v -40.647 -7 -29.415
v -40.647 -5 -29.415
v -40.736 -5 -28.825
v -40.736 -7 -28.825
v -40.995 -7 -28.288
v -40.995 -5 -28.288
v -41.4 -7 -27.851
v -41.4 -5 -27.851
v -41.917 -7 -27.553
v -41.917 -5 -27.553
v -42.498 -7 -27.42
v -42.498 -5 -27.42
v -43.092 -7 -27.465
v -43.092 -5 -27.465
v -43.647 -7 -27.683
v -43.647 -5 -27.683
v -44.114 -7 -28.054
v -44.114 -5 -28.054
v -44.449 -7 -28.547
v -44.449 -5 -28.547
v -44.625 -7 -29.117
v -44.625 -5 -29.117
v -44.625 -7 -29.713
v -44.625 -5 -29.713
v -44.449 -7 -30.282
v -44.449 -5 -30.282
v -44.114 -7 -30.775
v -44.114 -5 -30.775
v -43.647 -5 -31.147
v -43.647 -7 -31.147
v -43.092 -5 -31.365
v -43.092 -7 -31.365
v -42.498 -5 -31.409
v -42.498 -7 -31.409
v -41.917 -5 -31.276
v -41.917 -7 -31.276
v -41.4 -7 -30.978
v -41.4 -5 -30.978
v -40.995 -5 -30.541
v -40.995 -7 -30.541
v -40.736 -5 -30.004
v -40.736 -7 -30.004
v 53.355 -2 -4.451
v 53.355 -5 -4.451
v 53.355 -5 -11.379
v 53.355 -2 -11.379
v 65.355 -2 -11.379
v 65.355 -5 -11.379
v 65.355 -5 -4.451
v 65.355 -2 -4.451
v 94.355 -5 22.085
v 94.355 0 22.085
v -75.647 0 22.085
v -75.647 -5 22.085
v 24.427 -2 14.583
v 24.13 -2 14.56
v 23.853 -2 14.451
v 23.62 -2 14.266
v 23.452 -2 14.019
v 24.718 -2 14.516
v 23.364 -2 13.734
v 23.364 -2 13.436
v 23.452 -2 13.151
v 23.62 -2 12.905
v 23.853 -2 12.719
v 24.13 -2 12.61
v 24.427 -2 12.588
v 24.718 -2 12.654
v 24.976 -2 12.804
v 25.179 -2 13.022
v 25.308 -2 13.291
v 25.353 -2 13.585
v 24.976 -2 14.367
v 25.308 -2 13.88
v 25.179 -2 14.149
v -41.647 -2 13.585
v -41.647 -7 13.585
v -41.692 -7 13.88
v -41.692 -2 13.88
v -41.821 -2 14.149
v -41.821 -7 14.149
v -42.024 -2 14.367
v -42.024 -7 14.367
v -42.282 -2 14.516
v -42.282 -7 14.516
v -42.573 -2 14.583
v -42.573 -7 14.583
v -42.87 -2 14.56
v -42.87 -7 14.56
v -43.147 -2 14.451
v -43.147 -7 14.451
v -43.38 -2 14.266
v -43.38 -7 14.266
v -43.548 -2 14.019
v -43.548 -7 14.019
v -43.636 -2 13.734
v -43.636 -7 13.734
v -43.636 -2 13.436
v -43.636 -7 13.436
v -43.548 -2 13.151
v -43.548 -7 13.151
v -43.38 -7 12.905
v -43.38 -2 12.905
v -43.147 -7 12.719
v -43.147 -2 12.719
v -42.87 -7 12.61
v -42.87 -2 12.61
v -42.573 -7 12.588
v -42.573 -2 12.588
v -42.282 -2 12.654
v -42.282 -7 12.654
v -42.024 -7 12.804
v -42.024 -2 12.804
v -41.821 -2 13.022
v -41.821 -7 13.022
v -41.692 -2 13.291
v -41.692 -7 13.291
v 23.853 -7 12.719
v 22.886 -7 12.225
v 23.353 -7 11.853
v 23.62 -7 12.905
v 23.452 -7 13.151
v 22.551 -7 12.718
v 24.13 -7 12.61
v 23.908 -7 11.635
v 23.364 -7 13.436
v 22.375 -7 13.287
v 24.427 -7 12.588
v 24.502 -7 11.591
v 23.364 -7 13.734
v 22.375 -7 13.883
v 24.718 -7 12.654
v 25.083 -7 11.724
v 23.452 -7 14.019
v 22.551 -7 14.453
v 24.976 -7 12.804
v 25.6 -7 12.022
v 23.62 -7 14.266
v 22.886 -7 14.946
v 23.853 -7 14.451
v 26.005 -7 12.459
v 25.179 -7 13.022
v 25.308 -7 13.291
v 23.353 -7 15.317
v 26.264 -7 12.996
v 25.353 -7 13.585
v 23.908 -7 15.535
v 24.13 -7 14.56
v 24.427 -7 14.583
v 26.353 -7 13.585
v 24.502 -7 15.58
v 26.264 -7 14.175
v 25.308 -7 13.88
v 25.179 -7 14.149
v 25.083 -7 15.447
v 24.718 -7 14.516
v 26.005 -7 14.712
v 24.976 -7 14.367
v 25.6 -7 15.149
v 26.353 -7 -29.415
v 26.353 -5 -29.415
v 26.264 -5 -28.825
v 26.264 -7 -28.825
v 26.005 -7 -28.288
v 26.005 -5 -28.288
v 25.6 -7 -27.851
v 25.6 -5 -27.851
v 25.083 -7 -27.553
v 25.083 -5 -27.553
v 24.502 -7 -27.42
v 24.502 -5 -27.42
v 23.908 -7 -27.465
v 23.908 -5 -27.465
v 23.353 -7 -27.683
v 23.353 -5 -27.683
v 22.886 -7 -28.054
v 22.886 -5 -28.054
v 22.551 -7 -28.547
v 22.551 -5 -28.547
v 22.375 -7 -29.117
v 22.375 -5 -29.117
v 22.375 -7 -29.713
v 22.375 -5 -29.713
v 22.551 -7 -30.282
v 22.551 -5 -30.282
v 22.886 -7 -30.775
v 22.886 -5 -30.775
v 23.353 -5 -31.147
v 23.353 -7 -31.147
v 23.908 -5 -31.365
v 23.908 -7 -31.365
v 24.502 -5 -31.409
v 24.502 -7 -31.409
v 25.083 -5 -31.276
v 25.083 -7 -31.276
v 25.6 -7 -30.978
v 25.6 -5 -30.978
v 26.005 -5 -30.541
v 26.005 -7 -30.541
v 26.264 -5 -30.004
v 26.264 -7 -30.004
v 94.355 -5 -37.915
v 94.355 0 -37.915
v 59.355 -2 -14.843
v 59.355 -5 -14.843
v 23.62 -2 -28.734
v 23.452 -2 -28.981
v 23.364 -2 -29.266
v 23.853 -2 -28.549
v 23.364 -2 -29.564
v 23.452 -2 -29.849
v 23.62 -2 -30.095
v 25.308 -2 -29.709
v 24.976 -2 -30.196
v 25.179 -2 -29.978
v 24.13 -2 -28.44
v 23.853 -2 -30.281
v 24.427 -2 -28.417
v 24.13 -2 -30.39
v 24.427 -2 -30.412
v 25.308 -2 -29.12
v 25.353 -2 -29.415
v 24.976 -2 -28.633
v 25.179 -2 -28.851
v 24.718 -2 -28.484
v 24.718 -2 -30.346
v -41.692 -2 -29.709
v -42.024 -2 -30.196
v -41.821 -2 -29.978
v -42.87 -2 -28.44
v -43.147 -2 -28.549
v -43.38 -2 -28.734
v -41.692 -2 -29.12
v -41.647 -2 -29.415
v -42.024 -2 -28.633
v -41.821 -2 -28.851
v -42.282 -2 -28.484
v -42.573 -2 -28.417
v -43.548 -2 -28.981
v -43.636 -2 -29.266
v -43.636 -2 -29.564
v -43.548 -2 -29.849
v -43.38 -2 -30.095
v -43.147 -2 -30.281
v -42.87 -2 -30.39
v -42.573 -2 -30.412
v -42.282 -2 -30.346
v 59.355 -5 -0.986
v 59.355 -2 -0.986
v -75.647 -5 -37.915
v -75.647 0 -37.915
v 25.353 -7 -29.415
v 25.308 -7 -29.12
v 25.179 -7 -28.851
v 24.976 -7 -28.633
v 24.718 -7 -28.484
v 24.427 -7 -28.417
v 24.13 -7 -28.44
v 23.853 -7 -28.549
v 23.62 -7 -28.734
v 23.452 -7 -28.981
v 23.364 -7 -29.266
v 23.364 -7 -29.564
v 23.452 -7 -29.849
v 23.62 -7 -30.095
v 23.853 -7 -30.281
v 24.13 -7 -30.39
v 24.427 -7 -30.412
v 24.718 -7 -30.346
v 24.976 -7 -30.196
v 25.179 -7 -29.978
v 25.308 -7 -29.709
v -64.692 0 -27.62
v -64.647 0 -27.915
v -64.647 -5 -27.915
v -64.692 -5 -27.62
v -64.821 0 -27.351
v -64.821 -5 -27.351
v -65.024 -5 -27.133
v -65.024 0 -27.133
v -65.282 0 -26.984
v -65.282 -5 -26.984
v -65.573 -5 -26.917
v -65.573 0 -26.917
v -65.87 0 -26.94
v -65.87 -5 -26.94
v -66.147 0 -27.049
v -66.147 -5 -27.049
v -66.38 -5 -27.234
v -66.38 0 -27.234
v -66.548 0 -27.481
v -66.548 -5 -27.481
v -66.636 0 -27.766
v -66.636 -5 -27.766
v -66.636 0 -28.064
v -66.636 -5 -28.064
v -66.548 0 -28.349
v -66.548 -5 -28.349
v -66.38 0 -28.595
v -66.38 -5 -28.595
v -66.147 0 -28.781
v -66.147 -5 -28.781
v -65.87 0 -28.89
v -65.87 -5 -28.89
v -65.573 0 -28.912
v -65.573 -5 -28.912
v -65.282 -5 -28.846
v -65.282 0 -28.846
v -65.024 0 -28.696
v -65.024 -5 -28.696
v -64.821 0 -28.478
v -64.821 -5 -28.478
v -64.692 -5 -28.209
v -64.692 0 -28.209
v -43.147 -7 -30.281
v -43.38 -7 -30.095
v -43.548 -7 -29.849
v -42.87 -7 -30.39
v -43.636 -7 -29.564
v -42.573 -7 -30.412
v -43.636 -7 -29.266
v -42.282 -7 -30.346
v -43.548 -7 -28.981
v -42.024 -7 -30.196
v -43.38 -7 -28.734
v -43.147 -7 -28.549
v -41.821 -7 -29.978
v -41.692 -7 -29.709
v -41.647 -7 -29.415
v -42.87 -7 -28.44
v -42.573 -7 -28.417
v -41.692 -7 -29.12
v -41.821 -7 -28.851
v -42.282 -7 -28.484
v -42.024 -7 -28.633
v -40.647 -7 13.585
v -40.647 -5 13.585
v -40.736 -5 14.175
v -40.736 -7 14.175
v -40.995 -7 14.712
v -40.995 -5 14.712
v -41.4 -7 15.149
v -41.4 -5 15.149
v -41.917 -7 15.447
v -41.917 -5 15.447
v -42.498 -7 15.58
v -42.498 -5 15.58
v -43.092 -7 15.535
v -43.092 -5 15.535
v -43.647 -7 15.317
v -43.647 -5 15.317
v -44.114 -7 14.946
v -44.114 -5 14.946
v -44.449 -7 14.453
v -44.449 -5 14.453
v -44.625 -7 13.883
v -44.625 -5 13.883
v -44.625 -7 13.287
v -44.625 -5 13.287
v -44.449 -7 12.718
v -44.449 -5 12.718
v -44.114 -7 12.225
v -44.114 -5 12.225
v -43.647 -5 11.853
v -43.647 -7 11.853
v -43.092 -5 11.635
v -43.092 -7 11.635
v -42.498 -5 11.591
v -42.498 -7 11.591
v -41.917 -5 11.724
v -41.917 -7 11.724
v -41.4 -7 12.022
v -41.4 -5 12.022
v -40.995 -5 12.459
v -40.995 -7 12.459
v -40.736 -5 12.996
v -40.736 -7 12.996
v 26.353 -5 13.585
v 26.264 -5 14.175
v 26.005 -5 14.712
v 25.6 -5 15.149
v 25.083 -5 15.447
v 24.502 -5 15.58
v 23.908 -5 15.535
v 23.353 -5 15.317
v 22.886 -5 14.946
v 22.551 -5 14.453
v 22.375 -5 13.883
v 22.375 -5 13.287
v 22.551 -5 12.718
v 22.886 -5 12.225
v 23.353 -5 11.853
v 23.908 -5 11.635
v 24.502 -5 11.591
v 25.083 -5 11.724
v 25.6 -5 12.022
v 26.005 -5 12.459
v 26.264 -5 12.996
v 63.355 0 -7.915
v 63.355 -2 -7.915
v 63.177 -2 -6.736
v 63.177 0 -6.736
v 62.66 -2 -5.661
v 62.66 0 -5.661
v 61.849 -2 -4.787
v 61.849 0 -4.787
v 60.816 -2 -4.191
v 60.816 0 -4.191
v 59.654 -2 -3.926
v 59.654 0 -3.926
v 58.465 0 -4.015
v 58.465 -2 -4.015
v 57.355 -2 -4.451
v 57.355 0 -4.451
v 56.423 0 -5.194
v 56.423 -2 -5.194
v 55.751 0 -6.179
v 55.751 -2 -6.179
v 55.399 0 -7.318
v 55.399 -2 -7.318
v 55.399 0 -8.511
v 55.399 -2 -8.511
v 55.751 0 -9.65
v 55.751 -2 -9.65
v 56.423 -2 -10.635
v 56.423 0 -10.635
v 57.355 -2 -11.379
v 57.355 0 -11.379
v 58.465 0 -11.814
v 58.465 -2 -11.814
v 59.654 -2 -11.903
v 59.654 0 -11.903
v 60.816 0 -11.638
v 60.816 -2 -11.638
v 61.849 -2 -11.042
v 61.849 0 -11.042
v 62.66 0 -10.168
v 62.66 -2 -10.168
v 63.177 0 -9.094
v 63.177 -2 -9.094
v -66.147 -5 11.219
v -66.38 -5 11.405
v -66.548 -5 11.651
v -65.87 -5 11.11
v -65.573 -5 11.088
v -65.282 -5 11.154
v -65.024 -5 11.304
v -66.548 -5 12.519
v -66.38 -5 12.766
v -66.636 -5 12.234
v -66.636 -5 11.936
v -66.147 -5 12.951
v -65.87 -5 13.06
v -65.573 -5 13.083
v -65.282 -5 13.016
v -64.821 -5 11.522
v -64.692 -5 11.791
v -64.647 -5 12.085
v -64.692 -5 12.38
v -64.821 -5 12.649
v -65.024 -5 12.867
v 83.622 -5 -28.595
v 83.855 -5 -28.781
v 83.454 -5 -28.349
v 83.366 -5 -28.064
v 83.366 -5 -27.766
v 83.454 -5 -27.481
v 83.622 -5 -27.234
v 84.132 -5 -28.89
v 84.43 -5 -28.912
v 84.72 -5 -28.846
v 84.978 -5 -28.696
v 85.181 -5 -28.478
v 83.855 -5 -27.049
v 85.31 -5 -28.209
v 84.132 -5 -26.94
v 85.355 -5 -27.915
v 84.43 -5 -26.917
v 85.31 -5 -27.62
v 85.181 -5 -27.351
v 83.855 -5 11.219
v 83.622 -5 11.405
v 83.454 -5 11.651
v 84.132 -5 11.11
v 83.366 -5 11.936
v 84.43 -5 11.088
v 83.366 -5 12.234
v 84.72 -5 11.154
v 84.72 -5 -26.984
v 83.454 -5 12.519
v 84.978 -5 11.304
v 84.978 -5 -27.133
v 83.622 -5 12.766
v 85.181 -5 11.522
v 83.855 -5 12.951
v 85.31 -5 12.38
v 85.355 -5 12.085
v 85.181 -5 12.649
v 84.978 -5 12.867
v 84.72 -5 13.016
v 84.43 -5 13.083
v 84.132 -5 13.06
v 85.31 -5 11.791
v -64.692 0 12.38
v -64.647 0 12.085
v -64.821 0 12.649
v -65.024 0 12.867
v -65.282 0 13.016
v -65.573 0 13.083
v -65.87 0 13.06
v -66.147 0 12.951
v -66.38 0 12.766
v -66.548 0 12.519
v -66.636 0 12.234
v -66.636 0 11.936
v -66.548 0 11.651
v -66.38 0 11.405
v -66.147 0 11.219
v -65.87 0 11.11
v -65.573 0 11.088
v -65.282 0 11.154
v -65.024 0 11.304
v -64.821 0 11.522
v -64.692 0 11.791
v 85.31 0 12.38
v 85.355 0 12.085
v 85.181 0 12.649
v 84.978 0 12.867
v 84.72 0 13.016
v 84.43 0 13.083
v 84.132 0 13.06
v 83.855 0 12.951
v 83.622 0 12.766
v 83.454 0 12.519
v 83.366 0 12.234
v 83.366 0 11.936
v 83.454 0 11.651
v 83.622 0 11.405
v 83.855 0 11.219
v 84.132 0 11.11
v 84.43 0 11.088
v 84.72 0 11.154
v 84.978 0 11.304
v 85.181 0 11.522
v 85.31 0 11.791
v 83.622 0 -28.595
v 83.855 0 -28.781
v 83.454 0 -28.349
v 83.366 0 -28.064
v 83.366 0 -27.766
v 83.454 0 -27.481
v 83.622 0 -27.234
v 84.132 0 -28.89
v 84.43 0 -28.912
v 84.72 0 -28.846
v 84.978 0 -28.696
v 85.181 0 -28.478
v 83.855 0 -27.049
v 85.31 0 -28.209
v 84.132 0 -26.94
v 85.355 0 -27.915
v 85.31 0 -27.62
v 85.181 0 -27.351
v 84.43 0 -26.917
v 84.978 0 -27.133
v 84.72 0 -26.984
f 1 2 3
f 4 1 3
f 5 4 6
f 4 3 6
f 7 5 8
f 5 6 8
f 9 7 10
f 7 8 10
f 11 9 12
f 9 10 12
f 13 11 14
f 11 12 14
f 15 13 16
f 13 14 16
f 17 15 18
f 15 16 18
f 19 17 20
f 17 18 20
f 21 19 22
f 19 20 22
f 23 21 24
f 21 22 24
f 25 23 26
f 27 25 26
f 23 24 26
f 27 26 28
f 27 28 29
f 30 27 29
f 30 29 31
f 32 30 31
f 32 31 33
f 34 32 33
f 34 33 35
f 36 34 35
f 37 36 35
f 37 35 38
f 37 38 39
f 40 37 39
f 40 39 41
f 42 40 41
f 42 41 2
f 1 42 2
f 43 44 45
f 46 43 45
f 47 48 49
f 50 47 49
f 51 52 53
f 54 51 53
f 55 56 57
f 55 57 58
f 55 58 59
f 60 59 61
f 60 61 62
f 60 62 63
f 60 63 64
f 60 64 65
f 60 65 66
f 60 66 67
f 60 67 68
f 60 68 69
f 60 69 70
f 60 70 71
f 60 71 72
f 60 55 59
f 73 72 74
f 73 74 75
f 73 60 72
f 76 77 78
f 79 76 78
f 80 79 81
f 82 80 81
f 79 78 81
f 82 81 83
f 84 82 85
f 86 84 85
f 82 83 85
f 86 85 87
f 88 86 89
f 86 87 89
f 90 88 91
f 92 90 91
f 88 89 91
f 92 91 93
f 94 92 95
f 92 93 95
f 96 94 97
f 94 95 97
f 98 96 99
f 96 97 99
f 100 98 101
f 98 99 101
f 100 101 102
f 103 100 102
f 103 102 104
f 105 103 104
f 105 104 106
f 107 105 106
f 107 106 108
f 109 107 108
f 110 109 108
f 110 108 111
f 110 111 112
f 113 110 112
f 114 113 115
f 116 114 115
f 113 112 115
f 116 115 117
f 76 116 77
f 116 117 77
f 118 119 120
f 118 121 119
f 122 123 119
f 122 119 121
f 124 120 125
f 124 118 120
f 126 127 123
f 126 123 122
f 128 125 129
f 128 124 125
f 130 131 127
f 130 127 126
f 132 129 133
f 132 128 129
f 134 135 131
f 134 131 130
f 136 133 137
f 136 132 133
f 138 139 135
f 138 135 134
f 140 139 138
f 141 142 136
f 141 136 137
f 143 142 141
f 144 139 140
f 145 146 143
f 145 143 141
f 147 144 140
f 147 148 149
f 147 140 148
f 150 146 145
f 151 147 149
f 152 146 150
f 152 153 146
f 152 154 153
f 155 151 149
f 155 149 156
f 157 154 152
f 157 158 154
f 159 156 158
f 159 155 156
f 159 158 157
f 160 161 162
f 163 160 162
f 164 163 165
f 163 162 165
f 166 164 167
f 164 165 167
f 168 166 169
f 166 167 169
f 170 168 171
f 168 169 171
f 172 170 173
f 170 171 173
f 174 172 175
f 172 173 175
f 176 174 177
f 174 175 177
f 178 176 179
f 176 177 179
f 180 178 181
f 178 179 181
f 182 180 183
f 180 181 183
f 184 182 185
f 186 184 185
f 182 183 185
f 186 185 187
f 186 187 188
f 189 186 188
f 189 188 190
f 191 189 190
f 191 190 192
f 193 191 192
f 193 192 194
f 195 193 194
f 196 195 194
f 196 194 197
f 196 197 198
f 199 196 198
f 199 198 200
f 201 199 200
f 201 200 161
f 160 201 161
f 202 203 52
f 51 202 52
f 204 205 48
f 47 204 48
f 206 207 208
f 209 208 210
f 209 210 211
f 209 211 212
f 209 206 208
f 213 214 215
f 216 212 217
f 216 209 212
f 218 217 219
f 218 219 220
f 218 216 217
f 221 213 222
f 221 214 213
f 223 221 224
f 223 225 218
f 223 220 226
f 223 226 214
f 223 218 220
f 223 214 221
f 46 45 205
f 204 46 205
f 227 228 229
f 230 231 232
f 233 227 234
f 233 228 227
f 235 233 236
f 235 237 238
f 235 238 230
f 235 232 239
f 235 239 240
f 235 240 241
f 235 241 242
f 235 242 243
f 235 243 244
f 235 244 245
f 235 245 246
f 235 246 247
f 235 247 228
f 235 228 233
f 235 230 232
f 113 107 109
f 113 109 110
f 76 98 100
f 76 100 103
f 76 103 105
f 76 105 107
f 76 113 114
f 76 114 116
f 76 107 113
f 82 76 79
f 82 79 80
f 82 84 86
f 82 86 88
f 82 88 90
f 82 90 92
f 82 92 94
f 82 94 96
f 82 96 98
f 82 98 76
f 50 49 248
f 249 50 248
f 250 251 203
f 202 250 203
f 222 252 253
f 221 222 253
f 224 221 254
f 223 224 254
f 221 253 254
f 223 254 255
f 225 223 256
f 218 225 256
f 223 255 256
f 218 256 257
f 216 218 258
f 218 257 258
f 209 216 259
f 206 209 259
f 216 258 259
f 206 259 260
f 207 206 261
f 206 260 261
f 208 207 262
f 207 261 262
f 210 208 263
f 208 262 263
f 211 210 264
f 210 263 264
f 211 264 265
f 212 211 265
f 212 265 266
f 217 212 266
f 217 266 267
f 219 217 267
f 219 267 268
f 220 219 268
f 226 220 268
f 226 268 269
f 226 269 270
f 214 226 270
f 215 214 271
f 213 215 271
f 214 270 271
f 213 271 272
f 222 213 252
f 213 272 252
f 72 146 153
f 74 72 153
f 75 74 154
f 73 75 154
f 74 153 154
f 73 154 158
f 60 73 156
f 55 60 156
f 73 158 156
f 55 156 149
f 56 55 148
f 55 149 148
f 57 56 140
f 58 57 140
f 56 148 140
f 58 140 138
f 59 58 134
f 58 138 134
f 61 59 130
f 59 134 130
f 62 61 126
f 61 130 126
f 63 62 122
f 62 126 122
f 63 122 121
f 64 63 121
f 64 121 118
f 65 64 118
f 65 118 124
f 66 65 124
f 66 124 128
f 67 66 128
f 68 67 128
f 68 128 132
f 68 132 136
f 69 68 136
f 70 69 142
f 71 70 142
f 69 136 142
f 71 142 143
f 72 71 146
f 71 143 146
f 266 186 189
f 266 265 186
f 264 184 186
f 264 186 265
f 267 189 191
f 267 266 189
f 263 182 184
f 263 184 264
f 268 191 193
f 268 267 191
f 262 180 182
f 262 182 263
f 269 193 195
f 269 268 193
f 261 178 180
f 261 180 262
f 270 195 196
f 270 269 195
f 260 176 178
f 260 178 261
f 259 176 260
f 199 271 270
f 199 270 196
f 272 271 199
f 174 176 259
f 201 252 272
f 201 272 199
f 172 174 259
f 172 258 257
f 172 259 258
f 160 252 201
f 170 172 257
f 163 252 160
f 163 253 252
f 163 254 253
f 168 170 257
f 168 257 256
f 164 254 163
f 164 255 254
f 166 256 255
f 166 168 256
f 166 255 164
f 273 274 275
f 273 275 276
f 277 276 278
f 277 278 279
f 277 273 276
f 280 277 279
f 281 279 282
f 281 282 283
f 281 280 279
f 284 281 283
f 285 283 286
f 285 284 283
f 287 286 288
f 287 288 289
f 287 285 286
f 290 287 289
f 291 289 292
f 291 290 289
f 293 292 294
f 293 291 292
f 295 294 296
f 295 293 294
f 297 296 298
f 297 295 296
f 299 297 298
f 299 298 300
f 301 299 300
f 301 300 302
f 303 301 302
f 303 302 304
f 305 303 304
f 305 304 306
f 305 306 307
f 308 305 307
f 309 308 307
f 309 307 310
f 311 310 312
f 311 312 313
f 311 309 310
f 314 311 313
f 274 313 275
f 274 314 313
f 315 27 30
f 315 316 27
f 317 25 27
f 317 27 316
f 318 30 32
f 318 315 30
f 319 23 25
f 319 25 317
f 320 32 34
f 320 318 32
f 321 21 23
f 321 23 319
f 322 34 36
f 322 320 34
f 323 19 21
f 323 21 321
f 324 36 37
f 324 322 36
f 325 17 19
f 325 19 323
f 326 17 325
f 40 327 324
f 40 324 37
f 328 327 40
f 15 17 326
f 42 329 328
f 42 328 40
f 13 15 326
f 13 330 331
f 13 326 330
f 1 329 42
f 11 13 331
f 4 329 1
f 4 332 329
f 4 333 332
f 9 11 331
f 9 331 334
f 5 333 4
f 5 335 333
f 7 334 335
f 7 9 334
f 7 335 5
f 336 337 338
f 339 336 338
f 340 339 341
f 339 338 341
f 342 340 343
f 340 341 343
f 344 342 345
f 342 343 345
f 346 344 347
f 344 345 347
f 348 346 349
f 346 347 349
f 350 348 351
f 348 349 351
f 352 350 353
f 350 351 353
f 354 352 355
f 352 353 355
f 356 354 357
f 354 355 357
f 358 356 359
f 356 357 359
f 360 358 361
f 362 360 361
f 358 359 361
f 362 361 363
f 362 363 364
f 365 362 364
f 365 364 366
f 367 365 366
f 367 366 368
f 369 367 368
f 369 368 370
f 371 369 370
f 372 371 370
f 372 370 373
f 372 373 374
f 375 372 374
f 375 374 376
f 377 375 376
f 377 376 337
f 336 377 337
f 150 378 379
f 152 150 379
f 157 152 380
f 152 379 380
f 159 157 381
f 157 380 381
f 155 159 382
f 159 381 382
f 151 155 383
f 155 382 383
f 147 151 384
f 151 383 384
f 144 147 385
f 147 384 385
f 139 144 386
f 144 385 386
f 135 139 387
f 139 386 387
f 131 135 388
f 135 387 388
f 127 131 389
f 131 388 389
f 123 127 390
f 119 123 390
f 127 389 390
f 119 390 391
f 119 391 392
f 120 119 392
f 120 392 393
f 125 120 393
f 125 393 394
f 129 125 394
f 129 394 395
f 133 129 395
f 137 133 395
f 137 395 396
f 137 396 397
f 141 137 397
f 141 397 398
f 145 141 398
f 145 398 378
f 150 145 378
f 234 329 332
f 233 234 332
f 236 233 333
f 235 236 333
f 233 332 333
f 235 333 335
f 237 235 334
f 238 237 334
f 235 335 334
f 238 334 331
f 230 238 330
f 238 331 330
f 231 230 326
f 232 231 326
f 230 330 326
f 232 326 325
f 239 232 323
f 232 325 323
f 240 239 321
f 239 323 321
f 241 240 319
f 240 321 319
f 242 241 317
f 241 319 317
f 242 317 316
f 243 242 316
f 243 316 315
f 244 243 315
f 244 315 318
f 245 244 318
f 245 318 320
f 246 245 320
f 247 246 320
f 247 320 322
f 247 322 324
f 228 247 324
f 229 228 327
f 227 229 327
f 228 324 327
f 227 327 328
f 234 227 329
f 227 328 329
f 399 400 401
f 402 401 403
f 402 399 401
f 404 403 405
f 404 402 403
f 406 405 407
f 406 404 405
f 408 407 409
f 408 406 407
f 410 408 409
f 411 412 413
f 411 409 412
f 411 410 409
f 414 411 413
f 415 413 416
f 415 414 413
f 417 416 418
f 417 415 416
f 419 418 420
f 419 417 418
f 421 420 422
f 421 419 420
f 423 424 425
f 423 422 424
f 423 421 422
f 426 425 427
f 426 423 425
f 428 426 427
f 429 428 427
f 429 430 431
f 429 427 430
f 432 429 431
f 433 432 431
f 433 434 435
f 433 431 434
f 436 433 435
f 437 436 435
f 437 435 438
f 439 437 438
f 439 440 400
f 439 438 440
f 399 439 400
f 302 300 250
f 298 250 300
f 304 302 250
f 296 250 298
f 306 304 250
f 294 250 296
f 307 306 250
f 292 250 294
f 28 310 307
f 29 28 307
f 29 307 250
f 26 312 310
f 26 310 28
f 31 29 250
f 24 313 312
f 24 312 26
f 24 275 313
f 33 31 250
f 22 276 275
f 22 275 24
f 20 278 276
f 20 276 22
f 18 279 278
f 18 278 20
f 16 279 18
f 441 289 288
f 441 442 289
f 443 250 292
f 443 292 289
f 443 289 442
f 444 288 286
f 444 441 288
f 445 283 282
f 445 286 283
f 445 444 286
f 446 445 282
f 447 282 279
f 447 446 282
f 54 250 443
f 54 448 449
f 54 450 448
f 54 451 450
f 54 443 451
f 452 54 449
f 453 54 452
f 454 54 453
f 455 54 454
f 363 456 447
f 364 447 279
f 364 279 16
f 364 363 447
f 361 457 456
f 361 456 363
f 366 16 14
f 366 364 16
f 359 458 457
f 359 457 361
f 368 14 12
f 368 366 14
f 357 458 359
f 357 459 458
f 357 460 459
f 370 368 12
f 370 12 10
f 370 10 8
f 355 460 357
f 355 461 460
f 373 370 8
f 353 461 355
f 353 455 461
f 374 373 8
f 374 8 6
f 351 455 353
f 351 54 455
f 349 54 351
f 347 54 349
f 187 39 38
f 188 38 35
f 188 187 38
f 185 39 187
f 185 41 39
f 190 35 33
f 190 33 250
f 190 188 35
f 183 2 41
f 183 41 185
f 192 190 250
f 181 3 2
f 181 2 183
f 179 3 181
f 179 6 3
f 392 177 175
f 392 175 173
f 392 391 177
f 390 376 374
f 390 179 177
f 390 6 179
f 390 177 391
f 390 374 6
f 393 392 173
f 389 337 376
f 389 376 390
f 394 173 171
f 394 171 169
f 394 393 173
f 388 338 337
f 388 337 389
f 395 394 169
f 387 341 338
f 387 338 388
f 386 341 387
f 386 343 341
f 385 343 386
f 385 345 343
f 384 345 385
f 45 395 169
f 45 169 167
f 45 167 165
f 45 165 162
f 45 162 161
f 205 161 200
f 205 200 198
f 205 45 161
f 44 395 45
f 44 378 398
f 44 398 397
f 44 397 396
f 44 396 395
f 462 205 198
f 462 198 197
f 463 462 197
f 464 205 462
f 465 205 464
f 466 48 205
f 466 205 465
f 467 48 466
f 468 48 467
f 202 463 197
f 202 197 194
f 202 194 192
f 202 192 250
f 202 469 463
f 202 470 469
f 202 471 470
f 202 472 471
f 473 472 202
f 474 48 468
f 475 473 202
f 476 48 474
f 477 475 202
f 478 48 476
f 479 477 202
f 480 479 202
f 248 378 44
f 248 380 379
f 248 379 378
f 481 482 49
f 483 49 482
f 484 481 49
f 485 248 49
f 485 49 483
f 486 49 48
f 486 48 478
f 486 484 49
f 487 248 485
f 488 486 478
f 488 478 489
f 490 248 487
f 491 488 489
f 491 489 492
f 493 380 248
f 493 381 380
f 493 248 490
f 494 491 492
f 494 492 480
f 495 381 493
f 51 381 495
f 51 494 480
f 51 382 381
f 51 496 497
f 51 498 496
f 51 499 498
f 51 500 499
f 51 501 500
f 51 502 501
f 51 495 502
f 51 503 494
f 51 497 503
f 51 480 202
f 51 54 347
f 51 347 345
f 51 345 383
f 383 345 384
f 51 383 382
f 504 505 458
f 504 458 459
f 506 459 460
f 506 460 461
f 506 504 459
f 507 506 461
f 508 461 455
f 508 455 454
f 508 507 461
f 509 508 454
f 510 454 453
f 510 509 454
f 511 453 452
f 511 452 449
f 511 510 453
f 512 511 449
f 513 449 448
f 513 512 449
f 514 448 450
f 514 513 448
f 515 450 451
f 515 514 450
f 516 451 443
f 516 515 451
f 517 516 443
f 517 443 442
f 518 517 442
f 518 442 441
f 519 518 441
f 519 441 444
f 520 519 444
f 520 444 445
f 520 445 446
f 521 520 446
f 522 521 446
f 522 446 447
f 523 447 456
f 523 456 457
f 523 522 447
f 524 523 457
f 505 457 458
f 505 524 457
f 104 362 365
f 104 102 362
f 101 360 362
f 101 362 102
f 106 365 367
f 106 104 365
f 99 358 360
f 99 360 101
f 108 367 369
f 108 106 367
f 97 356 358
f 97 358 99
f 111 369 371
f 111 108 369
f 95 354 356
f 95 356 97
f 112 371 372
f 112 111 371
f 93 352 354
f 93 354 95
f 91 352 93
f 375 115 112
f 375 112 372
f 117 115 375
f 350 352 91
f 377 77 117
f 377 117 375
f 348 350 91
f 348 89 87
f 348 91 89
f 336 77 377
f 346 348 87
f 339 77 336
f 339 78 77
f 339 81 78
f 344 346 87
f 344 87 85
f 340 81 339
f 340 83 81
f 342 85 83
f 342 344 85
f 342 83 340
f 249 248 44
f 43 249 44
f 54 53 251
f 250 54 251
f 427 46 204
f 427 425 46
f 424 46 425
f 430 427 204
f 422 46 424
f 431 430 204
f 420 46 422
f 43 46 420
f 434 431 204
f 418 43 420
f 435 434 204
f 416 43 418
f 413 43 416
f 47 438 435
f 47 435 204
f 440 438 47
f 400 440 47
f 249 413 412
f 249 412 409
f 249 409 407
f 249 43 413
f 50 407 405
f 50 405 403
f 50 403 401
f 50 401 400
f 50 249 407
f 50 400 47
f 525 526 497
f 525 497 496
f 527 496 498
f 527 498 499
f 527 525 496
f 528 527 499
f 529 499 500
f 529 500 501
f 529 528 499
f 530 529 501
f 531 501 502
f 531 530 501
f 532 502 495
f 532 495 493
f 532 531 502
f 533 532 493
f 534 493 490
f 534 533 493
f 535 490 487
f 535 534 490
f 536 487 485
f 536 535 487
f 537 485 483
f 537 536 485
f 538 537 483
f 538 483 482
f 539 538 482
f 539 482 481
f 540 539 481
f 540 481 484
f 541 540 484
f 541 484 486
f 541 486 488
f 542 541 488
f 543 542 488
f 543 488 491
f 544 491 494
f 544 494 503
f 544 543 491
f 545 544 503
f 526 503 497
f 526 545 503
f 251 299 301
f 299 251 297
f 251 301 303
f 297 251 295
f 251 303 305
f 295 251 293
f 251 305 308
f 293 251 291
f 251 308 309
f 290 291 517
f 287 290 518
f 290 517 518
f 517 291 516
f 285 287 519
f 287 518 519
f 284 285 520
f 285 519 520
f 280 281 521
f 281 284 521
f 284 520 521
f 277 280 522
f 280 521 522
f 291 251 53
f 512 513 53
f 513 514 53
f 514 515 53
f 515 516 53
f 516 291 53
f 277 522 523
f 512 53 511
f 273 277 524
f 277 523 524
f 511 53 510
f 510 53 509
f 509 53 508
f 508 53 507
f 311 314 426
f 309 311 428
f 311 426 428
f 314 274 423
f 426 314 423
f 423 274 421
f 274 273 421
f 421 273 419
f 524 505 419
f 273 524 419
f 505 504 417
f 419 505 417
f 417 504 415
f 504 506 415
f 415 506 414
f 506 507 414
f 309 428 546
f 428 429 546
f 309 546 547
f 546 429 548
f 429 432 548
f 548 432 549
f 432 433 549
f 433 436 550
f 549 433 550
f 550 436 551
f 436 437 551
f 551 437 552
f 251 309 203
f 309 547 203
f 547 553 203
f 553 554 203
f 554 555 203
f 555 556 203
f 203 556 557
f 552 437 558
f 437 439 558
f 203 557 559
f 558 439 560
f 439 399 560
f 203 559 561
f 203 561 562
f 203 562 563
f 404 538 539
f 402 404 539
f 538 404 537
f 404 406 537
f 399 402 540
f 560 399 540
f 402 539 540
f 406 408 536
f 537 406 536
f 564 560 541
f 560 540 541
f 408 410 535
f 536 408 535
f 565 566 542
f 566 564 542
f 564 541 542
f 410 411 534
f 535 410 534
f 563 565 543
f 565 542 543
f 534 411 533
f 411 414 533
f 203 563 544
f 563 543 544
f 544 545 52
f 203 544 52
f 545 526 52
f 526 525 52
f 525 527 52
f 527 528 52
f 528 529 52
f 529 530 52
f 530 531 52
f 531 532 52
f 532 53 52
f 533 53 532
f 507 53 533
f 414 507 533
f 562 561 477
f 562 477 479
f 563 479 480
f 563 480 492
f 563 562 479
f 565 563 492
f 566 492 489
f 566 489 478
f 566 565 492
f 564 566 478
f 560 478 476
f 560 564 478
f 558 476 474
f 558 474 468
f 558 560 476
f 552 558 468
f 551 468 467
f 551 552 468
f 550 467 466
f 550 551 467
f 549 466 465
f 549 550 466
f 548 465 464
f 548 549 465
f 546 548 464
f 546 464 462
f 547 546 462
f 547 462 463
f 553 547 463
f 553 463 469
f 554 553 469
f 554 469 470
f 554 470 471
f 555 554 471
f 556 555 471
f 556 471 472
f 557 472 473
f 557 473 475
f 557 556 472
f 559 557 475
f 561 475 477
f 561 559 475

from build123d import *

# Parameters (mm, degrees)
F0_R      = 1
F0_R_2    = 2
F0_R_3    = 4
F1_DEPTH  = 5
F2_DEPTH  = 7
F3_DEPTH  = 6.604
F4_R      = 1
F5_DEPTH  = 5
F6_R      = 1
F7_DEPTH  = 5
F8_R      = 1
F9_DEPTH  = 5
F10_R     = 1
F11_DEPTH = 5
F13_DEPTH = 3


with BuildPart() as f1:
    # F0 (on Front) → F1 (new body)
    with BuildSketch(Plane.XZ):
        Polygon((-75.6474129446, -7.9146586359), (-75.6474129446, -37.9146586359), (94.3547870554, -37.9146586359), (94.3547870554, 22.0853413641), (59.3547870554, 22.0853413641), (24.3525870554, 22.0853413641), (-75.6474129446, 22.0853413641), align=None)
        with Locations((-65.6474129446, -27.9146586359)):
            Circle(F0_R, mode=Mode.SUBTRACT)
        with Locations((-42.6474129446, -29.4146586359)):
            Circle(F0_R_2, mode=Mode.SUBTRACT)
        with Locations((24.3525870554, -29.4146586359)):
            Circle(F0_R_2, mode=Mode.SUBTRACT)
        with Locations((84.3547870554, -27.9146586359)):
            Circle(F0_R, mode=Mode.SUBTRACT)
        Polygon((59.3547870554, -0.9864554056), (65.3547870554, -4.4505570207), (65.3547870554, -11.378760251), (59.3547870554, -14.8428618661), (53.3547870554, -11.378760251), (53.3547870554, -4.4505570207), align=None, mode=Mode.SUBTRACT)
        with Locations((-65.6474129446, 12.0853413641)):
            Circle(F0_R, mode=Mode.SUBTRACT)
        with Locations((-42.6474129446, 13.5853413641)):
            Circle(F0_R_2, mode=Mode.SUBTRACT)
        with Locations((24.3525870554, 13.5853413641)):
            Circle(F0_R_2, mode=Mode.SUBTRACT)
        with Locations((84.3547870554, 12.0853413641)):
            Circle(F0_R, mode=Mode.SUBTRACT)
        Polygon((65.3547870554, -11.378760251), (65.3547870554, -4.4505570207), (59.3547870554, -0.9864554056), (53.3547870554, -4.4505570207), (53.3547870554, -11.378760251), (59.3547870554, -14.8428618661), align=None)
        with Locations((59.3547870554, -7.9146586359)):
            Circle(F0_R_3, mode=Mode.SUBTRACT)
        with Locations((24.3525870554, -29.4146586359)):
            Circle(F0_R_2)
        with Locations((24.3525870554, -29.4146586359)):
            Circle(F0_R, mode=Mode.SUBTRACT)
        with Locations((-42.6474129446, -29.4146586359)):
            Circle(F0_R_2)
        with Locations((-42.6474129446, -29.4146586359)):
            Circle(F0_R, mode=Mode.SUBTRACT)
        with Locations((-42.6474129446, 13.5853413641)):
            Circle(F0_R_2)
        with Locations((-42.6474129446, 13.5853413641)):
            Circle(F0_R, mode=Mode.SUBTRACT)
        with Locations((24.3525870554, 13.5853413641)):
            Circle(F0_R_2)
        with Locations((24.3525870554, 13.5853413641)):
            Circle(F0_R, mode=Mode.SUBTRACT)
        with Locations((24.3525870554, -29.4146586359)):
            Circle(F0_R)
        with Locations((-42.6474129446, -29.4146586359)):
            Circle(F0_R)
        with Locations((-42.6474129446, 13.5853413641)):
            Circle(F0_R)
        with Locations((24.3525870554, 13.5853413641)):
            Circle(F0_R)
    extrude(amount=F1_DEPTH)

    # F0 (on Front) → F2 (join)
    with BuildSketch(Plane.XZ):
        with Locations((-42.6474129446, 13.5853413641)):
            Circle(F0_R_2)
        with Locations((-42.6474129446, 13.5853413641)):
            Circle(F0_R, mode=Mode.SUBTRACT)
        with Locations((-42.6474129446, -29.4146586359)):
            Circle(F0_R_2)
        with Locations((-42.6474129446, -29.4146586359)):
            Circle(F0_R, mode=Mode.SUBTRACT)
        with Locations((24.3525870554, -29.4146586359)):
            Circle(F0_R_2)
        with Locations((24.3525870554, -29.4146586359)):
            Circle(F0_R, mode=Mode.SUBTRACT)
        with Locations((24.3525870554, 13.5853413641)):
            Circle(F0_R_2)
        with Locations((24.3525870554, 13.5853413641)):
            Circle(F0_R, mode=Mode.SUBTRACT)
        with Locations((-42.6474129446, -29.4146586359)):
            Circle(F0_R)
        with Locations((-42.6474129446, 13.5853413641)):
            Circle(F0_R)
        with Locations((24.3525870554, 13.5853413641)):
            Circle(F0_R)
        with Locations((24.3525870554, -29.4146586359)):
            Circle(F0_R)
    extrude(amount=F2_DEPTH)

    # F0 (on Front) → F3 (join)
    with BuildSketch(Plane.XZ):
        with Locations((-42.6474129446, 13.5853413641)):
            Circle(F0_R)
        with Locations((24.3525870554, 13.5853413641)):
            Circle(F0_R)
        with Locations((-42.6474129446, -29.4146586359)):
            Circle(F0_R)
    extrude(amount=F3_DEPTH)

    # F4 (on face) → F5 (cut)
    with BuildSketch(Plane.XZ.offset(7)):
        with Locations((-42.6474129446, 13.5853413641)):
            Circle(F4_R)
    extrude(amount=-F5_DEPTH, mode=Mode.SUBTRACT)

    # F6 (on face) → F7 (cut)
    with BuildSketch(Plane.XZ.offset(7)):
        with Locations((24.3525870554, 13.5853413641)):
            Circle(F6_R)
    extrude(amount=-F7_DEPTH, mode=Mode.SUBTRACT)

    # F8 (on face) → F9 (cut)
    with BuildSketch(Plane.XZ.offset(7)):
        with Locations((-42.6474129446, -29.4146586359)):
            Circle(F8_R)
    extrude(amount=-F9_DEPTH, mode=Mode.SUBTRACT)

    # F10 (on face) → F11 (cut)
    with BuildSketch(Plane.XZ.offset(7)):
        with Locations((24.3525870554, -29.4146586359)):
            Circle(F10_R)
    extrude(amount=-F11_DEPTH, mode=Mode.SUBTRACT)

    # F12 (on face) → F13 (cut)
    with BuildSketch(Plane.XZ.offset(5)):
        Polygon((65.3547870554, -11.378760251), (65.3547870554, -4.4505570207), (59.3547870554, -0.9864554056), (53.3547870554, -4.4505570207), (53.3547870554, -11.378760251), (59.3547870554, -14.8428618661), align=None)
    extrude(amount=-F13_DEPTH, mode=Mode.SUBTRACT)


solid = f1.part
